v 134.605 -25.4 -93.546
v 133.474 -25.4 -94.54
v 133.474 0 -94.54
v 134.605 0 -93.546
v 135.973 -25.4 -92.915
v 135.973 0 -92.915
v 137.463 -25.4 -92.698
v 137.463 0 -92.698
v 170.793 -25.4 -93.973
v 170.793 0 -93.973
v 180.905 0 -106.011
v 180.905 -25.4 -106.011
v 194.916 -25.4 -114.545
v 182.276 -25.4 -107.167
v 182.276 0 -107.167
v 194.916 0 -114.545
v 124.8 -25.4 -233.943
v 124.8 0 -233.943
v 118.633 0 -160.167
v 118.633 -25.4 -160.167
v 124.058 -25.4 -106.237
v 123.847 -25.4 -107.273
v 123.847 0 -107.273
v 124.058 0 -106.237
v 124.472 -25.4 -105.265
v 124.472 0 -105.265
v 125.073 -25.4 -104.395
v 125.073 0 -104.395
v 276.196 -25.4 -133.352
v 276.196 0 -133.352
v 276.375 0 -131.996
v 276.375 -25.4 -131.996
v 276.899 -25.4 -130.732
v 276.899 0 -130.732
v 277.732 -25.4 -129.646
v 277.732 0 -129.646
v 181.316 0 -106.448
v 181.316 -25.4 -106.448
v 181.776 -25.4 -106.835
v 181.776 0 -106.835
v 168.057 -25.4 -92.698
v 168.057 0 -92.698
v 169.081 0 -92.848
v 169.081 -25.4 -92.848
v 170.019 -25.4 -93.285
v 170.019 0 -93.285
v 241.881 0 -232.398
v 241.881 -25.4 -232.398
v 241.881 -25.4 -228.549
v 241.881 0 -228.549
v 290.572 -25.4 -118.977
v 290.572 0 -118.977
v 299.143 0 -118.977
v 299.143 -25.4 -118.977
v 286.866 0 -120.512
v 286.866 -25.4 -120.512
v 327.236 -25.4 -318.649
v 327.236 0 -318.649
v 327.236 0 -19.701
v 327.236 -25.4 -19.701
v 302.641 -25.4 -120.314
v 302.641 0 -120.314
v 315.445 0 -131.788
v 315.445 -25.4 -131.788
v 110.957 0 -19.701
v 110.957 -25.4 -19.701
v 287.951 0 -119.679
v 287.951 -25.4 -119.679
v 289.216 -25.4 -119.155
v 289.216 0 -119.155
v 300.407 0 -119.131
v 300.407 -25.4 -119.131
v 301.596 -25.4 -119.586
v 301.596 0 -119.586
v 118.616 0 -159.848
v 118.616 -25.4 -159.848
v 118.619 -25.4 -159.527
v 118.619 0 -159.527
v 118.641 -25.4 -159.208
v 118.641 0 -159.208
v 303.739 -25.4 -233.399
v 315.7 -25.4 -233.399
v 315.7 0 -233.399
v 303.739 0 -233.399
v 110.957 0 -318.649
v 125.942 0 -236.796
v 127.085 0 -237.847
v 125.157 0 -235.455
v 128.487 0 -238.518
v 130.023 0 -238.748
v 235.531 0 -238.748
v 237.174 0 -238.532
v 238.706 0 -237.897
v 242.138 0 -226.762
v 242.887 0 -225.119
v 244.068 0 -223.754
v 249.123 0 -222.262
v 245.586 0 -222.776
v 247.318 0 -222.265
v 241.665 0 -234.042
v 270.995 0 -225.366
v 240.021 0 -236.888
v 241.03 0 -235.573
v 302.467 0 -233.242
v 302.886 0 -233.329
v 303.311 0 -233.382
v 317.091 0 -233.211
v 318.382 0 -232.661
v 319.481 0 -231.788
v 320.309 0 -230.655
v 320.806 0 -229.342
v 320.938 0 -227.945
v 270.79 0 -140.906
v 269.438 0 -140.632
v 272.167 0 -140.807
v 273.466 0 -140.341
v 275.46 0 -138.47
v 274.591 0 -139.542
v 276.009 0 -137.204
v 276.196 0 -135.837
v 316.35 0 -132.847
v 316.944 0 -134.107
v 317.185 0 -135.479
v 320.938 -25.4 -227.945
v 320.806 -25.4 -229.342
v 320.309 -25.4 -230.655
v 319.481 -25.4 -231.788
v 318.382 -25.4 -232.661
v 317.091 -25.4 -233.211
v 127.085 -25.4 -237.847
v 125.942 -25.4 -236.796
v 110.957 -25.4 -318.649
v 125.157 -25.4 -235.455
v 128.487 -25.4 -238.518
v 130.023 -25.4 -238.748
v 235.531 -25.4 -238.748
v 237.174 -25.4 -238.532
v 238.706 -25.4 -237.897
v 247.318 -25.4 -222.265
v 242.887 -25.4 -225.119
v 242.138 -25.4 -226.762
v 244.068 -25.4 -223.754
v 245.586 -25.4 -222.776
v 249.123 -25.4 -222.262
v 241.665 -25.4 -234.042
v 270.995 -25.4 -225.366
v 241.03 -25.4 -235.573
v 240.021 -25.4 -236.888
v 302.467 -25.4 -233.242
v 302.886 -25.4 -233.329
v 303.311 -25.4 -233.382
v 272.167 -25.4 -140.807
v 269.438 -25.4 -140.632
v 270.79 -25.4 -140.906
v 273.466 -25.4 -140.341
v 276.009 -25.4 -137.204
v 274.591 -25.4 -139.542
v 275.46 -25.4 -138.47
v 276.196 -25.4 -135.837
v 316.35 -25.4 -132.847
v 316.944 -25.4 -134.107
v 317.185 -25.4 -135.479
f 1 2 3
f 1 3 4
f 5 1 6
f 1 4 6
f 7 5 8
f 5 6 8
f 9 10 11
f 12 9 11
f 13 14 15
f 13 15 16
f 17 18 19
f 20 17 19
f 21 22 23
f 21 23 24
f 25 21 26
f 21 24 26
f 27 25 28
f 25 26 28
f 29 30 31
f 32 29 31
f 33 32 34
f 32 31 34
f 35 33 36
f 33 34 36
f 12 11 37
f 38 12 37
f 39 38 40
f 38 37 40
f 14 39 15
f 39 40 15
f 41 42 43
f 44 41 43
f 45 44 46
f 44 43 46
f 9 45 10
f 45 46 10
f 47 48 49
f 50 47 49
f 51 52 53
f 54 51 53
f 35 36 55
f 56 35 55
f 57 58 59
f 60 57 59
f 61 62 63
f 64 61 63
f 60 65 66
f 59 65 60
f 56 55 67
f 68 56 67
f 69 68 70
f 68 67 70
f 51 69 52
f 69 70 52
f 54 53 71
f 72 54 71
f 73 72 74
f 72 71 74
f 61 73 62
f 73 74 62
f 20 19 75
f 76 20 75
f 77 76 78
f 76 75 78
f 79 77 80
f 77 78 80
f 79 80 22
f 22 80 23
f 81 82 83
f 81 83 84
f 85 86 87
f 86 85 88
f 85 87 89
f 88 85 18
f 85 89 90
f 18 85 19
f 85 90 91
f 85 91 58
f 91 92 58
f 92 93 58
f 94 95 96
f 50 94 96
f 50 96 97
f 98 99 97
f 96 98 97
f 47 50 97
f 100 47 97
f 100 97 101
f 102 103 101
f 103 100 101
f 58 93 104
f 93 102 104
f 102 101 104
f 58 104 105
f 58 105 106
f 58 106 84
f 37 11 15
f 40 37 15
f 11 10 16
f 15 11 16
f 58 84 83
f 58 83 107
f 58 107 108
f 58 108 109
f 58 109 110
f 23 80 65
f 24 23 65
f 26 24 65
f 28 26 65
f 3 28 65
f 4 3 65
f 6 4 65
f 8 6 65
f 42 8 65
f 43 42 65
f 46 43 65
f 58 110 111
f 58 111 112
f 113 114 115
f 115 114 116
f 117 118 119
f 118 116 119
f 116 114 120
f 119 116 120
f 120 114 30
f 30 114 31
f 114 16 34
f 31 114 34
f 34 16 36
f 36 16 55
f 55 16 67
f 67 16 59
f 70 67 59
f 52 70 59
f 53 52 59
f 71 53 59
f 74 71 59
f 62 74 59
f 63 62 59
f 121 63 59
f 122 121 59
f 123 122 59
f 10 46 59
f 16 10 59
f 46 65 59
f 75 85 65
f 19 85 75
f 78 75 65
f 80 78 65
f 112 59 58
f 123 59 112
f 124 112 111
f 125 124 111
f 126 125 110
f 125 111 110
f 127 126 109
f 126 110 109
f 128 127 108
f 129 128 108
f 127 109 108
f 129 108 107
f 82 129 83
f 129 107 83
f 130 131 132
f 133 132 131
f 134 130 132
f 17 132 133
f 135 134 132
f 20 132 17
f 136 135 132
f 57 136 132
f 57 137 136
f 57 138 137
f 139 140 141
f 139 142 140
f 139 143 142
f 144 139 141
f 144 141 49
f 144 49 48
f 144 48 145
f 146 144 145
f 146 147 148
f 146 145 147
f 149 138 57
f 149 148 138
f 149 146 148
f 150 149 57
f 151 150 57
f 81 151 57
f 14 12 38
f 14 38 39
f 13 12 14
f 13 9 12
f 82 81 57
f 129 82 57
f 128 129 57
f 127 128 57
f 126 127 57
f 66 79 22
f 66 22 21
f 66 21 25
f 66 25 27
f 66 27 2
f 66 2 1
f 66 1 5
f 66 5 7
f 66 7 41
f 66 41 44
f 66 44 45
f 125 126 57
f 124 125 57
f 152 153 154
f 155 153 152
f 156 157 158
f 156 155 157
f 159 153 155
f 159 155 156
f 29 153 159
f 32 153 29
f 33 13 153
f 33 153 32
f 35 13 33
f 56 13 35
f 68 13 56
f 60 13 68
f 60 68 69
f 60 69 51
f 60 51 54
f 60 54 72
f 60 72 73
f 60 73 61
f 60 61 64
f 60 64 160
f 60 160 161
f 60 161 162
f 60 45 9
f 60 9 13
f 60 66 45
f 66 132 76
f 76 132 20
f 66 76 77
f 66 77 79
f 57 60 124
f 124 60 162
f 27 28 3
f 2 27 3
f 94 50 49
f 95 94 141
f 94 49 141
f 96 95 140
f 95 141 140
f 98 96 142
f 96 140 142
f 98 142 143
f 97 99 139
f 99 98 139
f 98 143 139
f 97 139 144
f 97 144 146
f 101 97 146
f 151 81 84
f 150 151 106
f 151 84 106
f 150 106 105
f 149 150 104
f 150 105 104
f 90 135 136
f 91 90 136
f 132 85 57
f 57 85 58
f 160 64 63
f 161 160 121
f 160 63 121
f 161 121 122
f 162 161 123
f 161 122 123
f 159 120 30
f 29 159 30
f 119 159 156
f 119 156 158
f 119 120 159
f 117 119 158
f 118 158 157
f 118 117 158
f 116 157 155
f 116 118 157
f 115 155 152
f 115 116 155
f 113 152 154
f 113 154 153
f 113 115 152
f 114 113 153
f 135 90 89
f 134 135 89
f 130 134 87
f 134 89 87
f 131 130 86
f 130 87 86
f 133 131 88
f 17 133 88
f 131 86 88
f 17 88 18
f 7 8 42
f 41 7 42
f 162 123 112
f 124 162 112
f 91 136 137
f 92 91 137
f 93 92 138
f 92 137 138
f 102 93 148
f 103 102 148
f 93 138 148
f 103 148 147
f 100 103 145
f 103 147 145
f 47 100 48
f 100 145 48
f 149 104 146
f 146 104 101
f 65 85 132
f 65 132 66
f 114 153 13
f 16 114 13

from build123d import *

# Parameters (mm, degrees)
F0_W     = 216.278978
F0_H     = 298.947731
F1_DEPTH = 25.4
F3_DEPTH = 25.401
F4_R     = 5.08


with BuildPart() as f1:
    # F0 (on Front) → F1 (new body)
    with BuildSketch(Plane.XZ):
        with Locations((219.096657, -169.175098)):
            Rectangle(F0_W, F0_H)
        with BuildLine():
            Line((184.616528, -238.748165), (130.02329, -238.748165))
            ThreePointArc((130.02329, -238.748165), (126.474409, -237.364118), (124.799581, -233.942848))
            Line((124.799581, -233.942848), (118.633306, -160.167299))
            ThreePointArc((118.633306, -160.167299), (118.61527, -159.687422), (118.641226, -159.207907))
            Line((118.641226, -159.207907), (123.846745, -107.272929))
            ThreePointArc((123.846745, -107.272929), (124.240313, -105.74049), (125.073194, -104.395284))
            Line((125.073194, -104.395284), (133.473927, -94.539658))
            ThreePointArc((133.473927, -94.539658), (135.266342, -93.180753), (137.463267, -92.698165))
            Line((137.463267, -92.698165), (168.056644, -92.698165))
            ThreePointArc((168.056644, -92.698165), (169.565835, -93.032536), (170.792564, -93.973066))
            Line((170.792564, -93.973066), (180.904666, -106.011276))
            ThreePointArc((180.904666, -106.011276), (181.54046, -106.648087), (182.275801, -107.166771))
            Line((182.275801, -107.166771), (194.915857, -114.54529))
            ThreePointArc((194.915857, -114.54529), (196.686537, -116.243842), (197.490259, -118.562121))
            Line((197.490259, -118.562121), (198.506103, -128.94903))
            ThreePointArc((198.506103, -128.94903), (200.394922, -132.488586), (204.233364, -133.655834))
            Line((204.233364, -133.655834), (214.386911, -132.662812))
            ThreePointArc((214.386911, -132.662812), (218.225352, -133.83006), (220.114172, -137.369617))
            Line((220.114172, -137.369617), (221.566417, -152.21868))
            ThreePointArc((221.566417, -152.21868), (223.26186, -155.591256), (226.783449, -156.950375))
            Line((226.783449, -156.950375), (243.912482, -156.950375))
            ThreePointArc((243.912482, -156.950375), (244.805431, -157.026991), (245.672278, -157.254599))
            Line((245.672278, -157.254599), (263.762319, -163.70189))
            Line((263.762319, -163.70189), (269.194545, -165.637936))
            ThreePointArc((269.194545, -165.637936), (273.975354, -164.984071), (276.196264, -160.700236))
            Line((276.196264, -160.700236), (276.196264, -133.352479))
            ThreePointArc((276.196264, -133.352479), (276.595282, -131.346481), (277.73159, -129.645878))
            Line((277.73159, -129.645878), (286.865628, -120.511846))
            ThreePointArc((286.865628, -120.511846), (288.566229, -119.375541), (290.572226, -118.976524))
            Line((290.572226, -118.976524), (299.14298, -118.976524))
            ThreePointArc((299.14298, -118.976524), (301.0156, -119.322423), (302.641084, -120.314471))
            Line((302.641084, -120.314471), (315.445448, -131.787646))
            ThreePointArc((315.445448, -131.787646), (316.689157, -133.457128), (317.184955, -135.479049))
            Line((317.184955, -135.479049), (320.937758, -227.944813))
            ThreePointArc((320.937758, -227.944813), (319.481155, -231.788052), (315.700147, -233.399309))
            Line((315.700147, -233.399309), (303.73928, -233.399309))
            ThreePointArc((303.73928, -233.399309), (303.098145, -233.359953), (302.466639, -233.242477))
            Line((302.466639, -233.242477), (270.995202, -225.366149))
            ThreePointArc((270.995202, -225.366149), (270.726, -225.306254), (270.45402, -225.260601))
            Line((270.45402, -225.260601), (263.762319, -224.317615))
            Line((263.762319, -224.317615), (223.293336, -218.614775))
            Line((223.293336, -218.614775), (204.573976, -215.976866))
            ThreePointArc((204.573976, -215.976866), (201.545132, -216.45584), (199.302489, -218.547219))
            Line((199.302489, -218.547219), (189.156557, -236.126528))
            ThreePointArc((189.156557, -236.126528), (187.237828, -238.045686), (184.616528, -238.748165))
        make_face(mode=Mode.SUBTRACT)
    extrude(amount=F1_DEPTH)

    # F2 (on face) → F3 (cut, through all)
    with BuildSketch(Plane.XZ.offset(25.4)):
        with BuildLine():
            Line((194.915857, -114.54529), (184.616528, -238.748165))
            Line((184.616528, -238.748165), (235.530938, -238.748165))
            ThreePointArc((235.530938, -238.748165), (240.021066, -236.888293), (241.880938, -232.398165))
            Line((241.880938, -232.398165), (241.880938, -228.548973))
            ThreePointArc((241.880938, -228.548973), (244.068216, -223.753742), (249.123218, -222.261975))
            Line((249.123218, -222.261975), (270.995202, -225.366149))
            Line((270.995202, -225.366149), (270.995202, -172.679961))
            Line((270.995202, -172.679961), (284.431964, -163.976327))
            Line((284.431964, -163.976327), (282.256097, -145.11849))
            Line((282.256097, -145.11849), (194.915857, -114.54529))
        make_face()
    extrude(amount=-F3_DEPTH, mode=Mode.SUBTRACT)

    # F4
    f4_edges = [f1.edges().sort_by_distance(p)[0] for p in [
        (276.196264, -12.7, -142.997263),
    ]]
    fillet(f4_edges, radius=F4_R)


solid = f1.part
